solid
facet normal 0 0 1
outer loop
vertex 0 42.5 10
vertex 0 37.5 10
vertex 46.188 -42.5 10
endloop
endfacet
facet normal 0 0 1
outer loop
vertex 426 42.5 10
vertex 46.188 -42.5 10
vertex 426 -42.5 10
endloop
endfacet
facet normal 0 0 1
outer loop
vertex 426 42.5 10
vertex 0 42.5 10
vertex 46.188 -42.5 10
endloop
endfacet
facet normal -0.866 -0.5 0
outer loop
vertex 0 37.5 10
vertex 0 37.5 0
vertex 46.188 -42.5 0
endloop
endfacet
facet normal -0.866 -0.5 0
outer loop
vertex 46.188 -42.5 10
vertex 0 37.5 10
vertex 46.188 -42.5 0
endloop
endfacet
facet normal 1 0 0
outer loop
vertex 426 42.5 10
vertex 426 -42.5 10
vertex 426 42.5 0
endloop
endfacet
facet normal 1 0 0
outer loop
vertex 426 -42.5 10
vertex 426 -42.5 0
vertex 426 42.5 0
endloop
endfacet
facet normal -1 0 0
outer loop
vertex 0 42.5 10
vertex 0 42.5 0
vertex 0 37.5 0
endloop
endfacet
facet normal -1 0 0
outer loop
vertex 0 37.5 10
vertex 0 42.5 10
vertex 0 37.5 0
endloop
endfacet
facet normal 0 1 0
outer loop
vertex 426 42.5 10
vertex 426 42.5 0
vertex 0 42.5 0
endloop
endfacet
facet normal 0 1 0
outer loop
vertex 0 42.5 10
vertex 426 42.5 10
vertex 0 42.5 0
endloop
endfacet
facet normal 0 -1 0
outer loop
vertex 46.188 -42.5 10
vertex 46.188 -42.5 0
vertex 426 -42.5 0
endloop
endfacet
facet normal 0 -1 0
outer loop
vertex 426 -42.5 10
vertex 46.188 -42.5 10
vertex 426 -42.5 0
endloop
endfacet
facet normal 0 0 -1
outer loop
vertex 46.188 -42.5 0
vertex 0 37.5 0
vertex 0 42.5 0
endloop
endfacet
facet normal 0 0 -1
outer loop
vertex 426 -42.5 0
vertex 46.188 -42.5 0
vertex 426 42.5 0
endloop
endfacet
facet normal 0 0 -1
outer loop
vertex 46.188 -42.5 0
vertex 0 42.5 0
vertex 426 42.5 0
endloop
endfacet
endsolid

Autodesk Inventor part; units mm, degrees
ref_plane "YZ Plane" through (0, 0, 0) normal (1, 0, 0) x (0, 1, 0)
ref_plane "XZ Plane" through (0, 0, 0) normal (0, 1, 0) x (-1, 0, 0)
ref_plane "XY Plane" through (0, 0, 0) normal (0, 0, 1) x (1, 0, 0)
sketch "Sketch1" plane through (0, 0, 0) normal (0, 0, 1) x (1, 0, 0)
  line L0 (0, -42.5) -> (426, -42.5)
  line L1 (426, -42.5) -> (426, 42.5)
  line L2 (426, 42.5) -> (0, 42.5)
  line L3 (0, 42.5) -> (0, -42.5)
  line L4 (0, 37.5) -> (46.188, -42.5)
  point P0 (0, 0)
  point P1 (0, 50.9494)
  point P2 (0, 42.7975)
  point P3 (0, 0)
  dimension "d17" = 85
  dimension "d18" = 426
  dimension "d19" = 60
  dimension "d20" = 5
extrude "Plate1" add sketch "Sketch1" along normal blind 10 contours L4 L3 L2 L1 L0
equation "\"d16\" = Thickness"
equation "\"BendReliefDepth\" = 0.5 * Thickness"
equation "\"Thickness\" = 10"
properties part number "NVPH-346 feeder hose 3"
